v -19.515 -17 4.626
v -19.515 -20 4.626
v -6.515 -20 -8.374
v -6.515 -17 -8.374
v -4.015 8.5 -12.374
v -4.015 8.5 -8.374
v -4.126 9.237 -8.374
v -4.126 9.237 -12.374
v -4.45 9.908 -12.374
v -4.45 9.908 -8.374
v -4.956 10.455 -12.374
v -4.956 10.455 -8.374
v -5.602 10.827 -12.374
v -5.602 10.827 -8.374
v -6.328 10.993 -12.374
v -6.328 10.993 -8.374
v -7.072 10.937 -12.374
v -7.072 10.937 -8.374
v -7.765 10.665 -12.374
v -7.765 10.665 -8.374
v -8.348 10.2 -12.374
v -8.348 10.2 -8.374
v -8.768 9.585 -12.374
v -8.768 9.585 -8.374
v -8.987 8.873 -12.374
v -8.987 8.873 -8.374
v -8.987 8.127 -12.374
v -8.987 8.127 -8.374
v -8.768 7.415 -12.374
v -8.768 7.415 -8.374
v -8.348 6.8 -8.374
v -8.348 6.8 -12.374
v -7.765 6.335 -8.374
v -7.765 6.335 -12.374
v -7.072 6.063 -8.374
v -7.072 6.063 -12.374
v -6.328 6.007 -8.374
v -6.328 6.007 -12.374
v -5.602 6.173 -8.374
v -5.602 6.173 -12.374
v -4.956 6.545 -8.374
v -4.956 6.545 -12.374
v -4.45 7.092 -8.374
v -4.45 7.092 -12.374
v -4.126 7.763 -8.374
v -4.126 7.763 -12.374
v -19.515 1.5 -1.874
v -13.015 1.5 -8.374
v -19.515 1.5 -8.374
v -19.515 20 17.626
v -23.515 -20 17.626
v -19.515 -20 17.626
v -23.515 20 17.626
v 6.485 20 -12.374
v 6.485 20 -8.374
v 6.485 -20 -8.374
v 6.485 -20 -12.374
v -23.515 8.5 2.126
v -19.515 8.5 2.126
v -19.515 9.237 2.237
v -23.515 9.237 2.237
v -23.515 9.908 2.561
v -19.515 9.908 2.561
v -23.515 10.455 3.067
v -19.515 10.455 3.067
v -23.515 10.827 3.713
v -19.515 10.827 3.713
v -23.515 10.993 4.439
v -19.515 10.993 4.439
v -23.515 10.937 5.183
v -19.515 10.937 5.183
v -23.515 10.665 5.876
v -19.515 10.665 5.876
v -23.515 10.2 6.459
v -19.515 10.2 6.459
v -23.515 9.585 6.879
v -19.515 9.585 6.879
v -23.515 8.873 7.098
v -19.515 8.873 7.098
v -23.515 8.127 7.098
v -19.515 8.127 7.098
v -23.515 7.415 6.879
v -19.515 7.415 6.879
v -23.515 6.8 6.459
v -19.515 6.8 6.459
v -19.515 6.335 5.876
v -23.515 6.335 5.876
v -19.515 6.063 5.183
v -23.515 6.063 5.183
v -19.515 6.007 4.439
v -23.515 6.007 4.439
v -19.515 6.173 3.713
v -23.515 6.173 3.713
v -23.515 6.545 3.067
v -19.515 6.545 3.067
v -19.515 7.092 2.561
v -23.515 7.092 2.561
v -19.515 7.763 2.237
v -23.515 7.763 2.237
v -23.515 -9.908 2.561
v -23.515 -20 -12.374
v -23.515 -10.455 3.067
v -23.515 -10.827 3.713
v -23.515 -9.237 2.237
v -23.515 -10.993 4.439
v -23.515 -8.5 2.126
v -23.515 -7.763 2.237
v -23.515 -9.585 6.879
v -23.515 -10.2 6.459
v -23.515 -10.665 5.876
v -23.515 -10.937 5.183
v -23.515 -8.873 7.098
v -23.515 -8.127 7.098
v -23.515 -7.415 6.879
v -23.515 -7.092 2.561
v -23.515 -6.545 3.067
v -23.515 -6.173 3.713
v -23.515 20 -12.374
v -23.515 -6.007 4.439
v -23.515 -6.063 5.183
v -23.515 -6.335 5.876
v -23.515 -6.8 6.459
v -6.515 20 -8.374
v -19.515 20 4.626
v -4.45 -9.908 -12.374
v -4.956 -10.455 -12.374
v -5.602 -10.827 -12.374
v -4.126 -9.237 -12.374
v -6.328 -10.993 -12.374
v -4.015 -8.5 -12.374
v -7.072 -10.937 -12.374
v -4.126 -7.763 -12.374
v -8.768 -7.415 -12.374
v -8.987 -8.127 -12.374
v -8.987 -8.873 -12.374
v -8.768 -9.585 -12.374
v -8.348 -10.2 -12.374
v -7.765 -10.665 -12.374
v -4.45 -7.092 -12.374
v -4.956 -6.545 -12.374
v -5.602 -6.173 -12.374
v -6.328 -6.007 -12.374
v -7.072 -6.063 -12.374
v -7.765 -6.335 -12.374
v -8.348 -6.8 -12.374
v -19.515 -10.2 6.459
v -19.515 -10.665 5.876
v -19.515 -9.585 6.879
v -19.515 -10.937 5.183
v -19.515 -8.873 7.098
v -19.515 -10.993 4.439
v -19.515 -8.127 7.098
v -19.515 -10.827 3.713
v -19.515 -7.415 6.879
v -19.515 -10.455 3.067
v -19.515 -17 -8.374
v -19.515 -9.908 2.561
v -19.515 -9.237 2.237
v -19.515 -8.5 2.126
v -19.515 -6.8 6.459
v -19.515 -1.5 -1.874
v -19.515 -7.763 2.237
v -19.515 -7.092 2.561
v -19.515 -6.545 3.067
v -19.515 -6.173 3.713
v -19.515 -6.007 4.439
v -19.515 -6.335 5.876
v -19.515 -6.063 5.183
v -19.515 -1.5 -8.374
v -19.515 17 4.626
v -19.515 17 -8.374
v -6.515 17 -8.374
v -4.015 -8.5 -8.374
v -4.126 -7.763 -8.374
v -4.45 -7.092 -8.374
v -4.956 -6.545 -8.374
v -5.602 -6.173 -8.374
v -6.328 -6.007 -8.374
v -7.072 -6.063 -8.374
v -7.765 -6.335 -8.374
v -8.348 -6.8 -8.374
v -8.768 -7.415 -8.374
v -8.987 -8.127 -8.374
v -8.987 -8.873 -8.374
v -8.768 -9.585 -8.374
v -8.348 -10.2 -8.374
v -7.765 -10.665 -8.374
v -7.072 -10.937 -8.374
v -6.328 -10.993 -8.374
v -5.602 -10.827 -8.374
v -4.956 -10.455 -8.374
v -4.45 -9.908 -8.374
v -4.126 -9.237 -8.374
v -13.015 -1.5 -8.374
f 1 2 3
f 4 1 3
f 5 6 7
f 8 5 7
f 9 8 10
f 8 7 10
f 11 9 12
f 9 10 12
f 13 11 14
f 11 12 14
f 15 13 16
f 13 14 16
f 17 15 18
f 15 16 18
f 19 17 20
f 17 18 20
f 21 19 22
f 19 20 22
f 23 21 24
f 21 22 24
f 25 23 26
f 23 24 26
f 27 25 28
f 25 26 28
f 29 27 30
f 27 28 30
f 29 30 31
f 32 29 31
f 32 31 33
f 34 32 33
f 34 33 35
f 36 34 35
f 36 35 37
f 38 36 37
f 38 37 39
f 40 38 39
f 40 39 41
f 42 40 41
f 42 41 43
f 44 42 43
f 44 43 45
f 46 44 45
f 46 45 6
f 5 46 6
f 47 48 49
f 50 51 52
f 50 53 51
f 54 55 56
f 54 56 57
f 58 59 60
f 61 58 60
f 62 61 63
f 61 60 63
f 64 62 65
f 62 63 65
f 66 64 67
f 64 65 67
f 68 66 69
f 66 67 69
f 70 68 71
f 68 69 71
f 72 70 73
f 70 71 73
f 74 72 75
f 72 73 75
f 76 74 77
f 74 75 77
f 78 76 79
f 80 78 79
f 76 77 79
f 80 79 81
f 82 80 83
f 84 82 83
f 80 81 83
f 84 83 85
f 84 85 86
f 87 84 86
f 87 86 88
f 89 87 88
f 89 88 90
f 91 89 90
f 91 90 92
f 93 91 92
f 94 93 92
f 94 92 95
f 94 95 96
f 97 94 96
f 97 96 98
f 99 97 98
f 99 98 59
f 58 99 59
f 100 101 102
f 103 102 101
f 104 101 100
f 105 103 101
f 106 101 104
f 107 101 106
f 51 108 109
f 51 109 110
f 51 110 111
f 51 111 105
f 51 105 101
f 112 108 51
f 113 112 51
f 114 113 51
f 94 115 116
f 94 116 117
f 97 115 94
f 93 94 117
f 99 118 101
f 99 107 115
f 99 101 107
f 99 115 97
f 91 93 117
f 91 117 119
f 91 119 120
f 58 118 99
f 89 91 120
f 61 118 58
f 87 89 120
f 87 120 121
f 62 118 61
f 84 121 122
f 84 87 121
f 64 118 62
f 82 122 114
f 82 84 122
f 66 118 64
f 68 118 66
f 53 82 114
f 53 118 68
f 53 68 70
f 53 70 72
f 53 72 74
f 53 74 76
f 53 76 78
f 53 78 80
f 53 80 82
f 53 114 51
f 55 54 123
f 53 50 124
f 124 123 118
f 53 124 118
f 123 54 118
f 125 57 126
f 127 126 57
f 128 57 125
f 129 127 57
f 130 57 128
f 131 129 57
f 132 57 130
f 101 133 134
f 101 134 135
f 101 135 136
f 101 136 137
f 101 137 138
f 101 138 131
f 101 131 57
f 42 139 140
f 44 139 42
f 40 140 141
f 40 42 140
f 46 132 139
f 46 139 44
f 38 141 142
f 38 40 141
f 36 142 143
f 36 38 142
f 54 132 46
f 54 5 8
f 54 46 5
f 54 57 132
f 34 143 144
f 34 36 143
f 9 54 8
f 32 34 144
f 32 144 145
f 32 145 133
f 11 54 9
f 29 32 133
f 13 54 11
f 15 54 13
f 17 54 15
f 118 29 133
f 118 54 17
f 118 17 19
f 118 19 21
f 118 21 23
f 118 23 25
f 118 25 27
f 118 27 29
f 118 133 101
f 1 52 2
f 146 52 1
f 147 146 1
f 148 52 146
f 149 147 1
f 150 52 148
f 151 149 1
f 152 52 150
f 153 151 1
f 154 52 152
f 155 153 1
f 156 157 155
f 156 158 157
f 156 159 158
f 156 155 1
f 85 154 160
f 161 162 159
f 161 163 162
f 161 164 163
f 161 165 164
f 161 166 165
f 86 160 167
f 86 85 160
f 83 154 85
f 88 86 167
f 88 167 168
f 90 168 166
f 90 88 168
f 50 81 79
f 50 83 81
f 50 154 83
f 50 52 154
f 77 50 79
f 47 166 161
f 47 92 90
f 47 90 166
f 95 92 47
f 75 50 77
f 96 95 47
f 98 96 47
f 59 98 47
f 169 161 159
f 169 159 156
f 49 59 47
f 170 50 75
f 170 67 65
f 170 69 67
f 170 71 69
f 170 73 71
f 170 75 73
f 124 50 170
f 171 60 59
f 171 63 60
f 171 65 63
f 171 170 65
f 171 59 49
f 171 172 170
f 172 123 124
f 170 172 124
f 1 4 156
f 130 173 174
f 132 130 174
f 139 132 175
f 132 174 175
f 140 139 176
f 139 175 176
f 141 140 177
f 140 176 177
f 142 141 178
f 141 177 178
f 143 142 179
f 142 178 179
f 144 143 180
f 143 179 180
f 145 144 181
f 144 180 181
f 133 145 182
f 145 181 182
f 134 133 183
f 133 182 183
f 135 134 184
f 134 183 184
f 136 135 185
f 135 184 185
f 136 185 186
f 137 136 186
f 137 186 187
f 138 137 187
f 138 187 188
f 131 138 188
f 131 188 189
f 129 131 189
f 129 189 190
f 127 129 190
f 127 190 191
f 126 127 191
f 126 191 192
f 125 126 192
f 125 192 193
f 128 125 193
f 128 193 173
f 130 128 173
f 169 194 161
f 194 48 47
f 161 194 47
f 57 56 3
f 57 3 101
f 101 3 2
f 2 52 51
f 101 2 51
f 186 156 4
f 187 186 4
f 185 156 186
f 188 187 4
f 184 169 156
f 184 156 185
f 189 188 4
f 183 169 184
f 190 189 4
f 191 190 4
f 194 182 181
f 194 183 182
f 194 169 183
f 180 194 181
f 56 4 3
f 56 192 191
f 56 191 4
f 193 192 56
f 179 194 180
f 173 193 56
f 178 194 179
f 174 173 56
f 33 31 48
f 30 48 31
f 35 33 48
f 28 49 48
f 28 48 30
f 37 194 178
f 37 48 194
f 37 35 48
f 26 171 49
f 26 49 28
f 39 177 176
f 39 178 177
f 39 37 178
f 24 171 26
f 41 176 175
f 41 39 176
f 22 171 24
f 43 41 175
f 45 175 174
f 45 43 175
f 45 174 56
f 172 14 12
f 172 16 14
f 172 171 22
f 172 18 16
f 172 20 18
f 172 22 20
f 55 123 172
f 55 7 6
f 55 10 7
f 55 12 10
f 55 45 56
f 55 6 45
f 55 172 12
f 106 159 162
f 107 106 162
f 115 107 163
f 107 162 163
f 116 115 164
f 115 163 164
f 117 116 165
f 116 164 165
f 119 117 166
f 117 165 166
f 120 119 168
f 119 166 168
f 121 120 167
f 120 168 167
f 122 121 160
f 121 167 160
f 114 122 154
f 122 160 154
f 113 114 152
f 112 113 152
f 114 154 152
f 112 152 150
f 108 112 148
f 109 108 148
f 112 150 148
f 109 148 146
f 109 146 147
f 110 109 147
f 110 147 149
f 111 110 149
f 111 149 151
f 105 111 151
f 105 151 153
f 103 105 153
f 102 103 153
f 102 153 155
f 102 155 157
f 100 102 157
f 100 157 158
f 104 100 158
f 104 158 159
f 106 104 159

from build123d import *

# Parameters (mm, degrees)
SALIENTE_EXTRUIR1_DEPTH = 20
SALIENTE_EXTRUIR2_DEPTH = 3
SALIENTE_EXTRUIR3_DEPTH = 3
SALIENTE_EXTRUIR4_DEPTH = 1.5
CROQUIS5_R              = 2.5
CORTAR_EXTRUIR1_DEPTH   = 38.238203332
CROQUIS6_R              = 2.5
CORTAR_EXTRUIR2_DEPTH   = 41.360446068


with BuildPart() as part:
    # Croquis1 → Saliente-Extruir1 (new, symmetric)
    with BuildSketch(Plane(origin=(0, 0, 0), x_dir=(1, 0, 0), z_dir=(0, 1, 0))):
        Polygon((-19.515220747, 8.373775577), (6.484779253, 8.373775577), (6.484779253, 12.373775577), (-23.515220747, 12.373775577), (-23.515220747, -17.626224423), (-19.515220747, -17.626224423), align=None)
    extrude(amount=SALIENTE_EXTRUIR1_DEPTH, both=True)

    # Croquis2 → Saliente-Extruir2 (add)
    with BuildSketch(Plane.XZ.offset(20)):
        Polygon((-6.515220747, -8.373775577), (-19.515220747, -8.373775577), (-19.515220747, 4.626224423), align=None)
    extrude(amount=-SALIENTE_EXTRUIR2_DEPTH)

    # Croquis3 → Saliente-Extruir3 (add)
    with BuildSketch(Plane(origin=(0, 20, 0), x_dir=(1, 0, 0), z_dir=(0, 1, 0))):
        Polygon((-6.515220747, 8.373775577), (-19.515220747, -4.626224423), (-19.515220747, 8.373775577), align=None)
    extrude(amount=-SALIENTE_EXTRUIR3_DEPTH)

    # Croquis4 → Saliente-Extruir4 (add, symmetric)
    with BuildSketch(Plane(origin=(0, 0, 0), x_dir=(1, 0, 0), z_dir=(0, 1, 0))):
        Polygon((-13.015220747, 8.373775577), (-19.515220747, 1.873775577), (-19.515220747, 8.373775577), align=None)
    extrude(amount=SALIENTE_EXTRUIR4_DEPTH, both=True)

    # Croquis5 → Cortar-Extruir1 (cut, through all)
    with BuildSketch(Plane(origin=(-19.515220747, 0, 0), x_dir=(0, 0, -1), z_dir=(1, 0, 0))):
        with Locations((-4.626224423, -8.5)):
            Circle(CROQUIS5_R)
        with Locations((-4.626224423, 8.5)):
            Circle(CROQUIS5_R)
    extrude(amount=-CORTAR_EXTRUIR1_DEPTH, mode=Mode.SUBTRACT)

    # Croquis6 → Cortar-Extruir2 (cut, through all)
    with BuildSketch(Plane.XY.offset(-8.373775577)):
        with Locations((-6.515220747, -8.5)):
            Circle(CROQUIS6_R)
        with Locations((-6.515220747, 8.5)):
            Circle(CROQUIS6_R)
    extrude(amount=-CORTAR_EXTRUIR2_DEPTH, mode=Mode.SUBTRACT)


solid = part.part
